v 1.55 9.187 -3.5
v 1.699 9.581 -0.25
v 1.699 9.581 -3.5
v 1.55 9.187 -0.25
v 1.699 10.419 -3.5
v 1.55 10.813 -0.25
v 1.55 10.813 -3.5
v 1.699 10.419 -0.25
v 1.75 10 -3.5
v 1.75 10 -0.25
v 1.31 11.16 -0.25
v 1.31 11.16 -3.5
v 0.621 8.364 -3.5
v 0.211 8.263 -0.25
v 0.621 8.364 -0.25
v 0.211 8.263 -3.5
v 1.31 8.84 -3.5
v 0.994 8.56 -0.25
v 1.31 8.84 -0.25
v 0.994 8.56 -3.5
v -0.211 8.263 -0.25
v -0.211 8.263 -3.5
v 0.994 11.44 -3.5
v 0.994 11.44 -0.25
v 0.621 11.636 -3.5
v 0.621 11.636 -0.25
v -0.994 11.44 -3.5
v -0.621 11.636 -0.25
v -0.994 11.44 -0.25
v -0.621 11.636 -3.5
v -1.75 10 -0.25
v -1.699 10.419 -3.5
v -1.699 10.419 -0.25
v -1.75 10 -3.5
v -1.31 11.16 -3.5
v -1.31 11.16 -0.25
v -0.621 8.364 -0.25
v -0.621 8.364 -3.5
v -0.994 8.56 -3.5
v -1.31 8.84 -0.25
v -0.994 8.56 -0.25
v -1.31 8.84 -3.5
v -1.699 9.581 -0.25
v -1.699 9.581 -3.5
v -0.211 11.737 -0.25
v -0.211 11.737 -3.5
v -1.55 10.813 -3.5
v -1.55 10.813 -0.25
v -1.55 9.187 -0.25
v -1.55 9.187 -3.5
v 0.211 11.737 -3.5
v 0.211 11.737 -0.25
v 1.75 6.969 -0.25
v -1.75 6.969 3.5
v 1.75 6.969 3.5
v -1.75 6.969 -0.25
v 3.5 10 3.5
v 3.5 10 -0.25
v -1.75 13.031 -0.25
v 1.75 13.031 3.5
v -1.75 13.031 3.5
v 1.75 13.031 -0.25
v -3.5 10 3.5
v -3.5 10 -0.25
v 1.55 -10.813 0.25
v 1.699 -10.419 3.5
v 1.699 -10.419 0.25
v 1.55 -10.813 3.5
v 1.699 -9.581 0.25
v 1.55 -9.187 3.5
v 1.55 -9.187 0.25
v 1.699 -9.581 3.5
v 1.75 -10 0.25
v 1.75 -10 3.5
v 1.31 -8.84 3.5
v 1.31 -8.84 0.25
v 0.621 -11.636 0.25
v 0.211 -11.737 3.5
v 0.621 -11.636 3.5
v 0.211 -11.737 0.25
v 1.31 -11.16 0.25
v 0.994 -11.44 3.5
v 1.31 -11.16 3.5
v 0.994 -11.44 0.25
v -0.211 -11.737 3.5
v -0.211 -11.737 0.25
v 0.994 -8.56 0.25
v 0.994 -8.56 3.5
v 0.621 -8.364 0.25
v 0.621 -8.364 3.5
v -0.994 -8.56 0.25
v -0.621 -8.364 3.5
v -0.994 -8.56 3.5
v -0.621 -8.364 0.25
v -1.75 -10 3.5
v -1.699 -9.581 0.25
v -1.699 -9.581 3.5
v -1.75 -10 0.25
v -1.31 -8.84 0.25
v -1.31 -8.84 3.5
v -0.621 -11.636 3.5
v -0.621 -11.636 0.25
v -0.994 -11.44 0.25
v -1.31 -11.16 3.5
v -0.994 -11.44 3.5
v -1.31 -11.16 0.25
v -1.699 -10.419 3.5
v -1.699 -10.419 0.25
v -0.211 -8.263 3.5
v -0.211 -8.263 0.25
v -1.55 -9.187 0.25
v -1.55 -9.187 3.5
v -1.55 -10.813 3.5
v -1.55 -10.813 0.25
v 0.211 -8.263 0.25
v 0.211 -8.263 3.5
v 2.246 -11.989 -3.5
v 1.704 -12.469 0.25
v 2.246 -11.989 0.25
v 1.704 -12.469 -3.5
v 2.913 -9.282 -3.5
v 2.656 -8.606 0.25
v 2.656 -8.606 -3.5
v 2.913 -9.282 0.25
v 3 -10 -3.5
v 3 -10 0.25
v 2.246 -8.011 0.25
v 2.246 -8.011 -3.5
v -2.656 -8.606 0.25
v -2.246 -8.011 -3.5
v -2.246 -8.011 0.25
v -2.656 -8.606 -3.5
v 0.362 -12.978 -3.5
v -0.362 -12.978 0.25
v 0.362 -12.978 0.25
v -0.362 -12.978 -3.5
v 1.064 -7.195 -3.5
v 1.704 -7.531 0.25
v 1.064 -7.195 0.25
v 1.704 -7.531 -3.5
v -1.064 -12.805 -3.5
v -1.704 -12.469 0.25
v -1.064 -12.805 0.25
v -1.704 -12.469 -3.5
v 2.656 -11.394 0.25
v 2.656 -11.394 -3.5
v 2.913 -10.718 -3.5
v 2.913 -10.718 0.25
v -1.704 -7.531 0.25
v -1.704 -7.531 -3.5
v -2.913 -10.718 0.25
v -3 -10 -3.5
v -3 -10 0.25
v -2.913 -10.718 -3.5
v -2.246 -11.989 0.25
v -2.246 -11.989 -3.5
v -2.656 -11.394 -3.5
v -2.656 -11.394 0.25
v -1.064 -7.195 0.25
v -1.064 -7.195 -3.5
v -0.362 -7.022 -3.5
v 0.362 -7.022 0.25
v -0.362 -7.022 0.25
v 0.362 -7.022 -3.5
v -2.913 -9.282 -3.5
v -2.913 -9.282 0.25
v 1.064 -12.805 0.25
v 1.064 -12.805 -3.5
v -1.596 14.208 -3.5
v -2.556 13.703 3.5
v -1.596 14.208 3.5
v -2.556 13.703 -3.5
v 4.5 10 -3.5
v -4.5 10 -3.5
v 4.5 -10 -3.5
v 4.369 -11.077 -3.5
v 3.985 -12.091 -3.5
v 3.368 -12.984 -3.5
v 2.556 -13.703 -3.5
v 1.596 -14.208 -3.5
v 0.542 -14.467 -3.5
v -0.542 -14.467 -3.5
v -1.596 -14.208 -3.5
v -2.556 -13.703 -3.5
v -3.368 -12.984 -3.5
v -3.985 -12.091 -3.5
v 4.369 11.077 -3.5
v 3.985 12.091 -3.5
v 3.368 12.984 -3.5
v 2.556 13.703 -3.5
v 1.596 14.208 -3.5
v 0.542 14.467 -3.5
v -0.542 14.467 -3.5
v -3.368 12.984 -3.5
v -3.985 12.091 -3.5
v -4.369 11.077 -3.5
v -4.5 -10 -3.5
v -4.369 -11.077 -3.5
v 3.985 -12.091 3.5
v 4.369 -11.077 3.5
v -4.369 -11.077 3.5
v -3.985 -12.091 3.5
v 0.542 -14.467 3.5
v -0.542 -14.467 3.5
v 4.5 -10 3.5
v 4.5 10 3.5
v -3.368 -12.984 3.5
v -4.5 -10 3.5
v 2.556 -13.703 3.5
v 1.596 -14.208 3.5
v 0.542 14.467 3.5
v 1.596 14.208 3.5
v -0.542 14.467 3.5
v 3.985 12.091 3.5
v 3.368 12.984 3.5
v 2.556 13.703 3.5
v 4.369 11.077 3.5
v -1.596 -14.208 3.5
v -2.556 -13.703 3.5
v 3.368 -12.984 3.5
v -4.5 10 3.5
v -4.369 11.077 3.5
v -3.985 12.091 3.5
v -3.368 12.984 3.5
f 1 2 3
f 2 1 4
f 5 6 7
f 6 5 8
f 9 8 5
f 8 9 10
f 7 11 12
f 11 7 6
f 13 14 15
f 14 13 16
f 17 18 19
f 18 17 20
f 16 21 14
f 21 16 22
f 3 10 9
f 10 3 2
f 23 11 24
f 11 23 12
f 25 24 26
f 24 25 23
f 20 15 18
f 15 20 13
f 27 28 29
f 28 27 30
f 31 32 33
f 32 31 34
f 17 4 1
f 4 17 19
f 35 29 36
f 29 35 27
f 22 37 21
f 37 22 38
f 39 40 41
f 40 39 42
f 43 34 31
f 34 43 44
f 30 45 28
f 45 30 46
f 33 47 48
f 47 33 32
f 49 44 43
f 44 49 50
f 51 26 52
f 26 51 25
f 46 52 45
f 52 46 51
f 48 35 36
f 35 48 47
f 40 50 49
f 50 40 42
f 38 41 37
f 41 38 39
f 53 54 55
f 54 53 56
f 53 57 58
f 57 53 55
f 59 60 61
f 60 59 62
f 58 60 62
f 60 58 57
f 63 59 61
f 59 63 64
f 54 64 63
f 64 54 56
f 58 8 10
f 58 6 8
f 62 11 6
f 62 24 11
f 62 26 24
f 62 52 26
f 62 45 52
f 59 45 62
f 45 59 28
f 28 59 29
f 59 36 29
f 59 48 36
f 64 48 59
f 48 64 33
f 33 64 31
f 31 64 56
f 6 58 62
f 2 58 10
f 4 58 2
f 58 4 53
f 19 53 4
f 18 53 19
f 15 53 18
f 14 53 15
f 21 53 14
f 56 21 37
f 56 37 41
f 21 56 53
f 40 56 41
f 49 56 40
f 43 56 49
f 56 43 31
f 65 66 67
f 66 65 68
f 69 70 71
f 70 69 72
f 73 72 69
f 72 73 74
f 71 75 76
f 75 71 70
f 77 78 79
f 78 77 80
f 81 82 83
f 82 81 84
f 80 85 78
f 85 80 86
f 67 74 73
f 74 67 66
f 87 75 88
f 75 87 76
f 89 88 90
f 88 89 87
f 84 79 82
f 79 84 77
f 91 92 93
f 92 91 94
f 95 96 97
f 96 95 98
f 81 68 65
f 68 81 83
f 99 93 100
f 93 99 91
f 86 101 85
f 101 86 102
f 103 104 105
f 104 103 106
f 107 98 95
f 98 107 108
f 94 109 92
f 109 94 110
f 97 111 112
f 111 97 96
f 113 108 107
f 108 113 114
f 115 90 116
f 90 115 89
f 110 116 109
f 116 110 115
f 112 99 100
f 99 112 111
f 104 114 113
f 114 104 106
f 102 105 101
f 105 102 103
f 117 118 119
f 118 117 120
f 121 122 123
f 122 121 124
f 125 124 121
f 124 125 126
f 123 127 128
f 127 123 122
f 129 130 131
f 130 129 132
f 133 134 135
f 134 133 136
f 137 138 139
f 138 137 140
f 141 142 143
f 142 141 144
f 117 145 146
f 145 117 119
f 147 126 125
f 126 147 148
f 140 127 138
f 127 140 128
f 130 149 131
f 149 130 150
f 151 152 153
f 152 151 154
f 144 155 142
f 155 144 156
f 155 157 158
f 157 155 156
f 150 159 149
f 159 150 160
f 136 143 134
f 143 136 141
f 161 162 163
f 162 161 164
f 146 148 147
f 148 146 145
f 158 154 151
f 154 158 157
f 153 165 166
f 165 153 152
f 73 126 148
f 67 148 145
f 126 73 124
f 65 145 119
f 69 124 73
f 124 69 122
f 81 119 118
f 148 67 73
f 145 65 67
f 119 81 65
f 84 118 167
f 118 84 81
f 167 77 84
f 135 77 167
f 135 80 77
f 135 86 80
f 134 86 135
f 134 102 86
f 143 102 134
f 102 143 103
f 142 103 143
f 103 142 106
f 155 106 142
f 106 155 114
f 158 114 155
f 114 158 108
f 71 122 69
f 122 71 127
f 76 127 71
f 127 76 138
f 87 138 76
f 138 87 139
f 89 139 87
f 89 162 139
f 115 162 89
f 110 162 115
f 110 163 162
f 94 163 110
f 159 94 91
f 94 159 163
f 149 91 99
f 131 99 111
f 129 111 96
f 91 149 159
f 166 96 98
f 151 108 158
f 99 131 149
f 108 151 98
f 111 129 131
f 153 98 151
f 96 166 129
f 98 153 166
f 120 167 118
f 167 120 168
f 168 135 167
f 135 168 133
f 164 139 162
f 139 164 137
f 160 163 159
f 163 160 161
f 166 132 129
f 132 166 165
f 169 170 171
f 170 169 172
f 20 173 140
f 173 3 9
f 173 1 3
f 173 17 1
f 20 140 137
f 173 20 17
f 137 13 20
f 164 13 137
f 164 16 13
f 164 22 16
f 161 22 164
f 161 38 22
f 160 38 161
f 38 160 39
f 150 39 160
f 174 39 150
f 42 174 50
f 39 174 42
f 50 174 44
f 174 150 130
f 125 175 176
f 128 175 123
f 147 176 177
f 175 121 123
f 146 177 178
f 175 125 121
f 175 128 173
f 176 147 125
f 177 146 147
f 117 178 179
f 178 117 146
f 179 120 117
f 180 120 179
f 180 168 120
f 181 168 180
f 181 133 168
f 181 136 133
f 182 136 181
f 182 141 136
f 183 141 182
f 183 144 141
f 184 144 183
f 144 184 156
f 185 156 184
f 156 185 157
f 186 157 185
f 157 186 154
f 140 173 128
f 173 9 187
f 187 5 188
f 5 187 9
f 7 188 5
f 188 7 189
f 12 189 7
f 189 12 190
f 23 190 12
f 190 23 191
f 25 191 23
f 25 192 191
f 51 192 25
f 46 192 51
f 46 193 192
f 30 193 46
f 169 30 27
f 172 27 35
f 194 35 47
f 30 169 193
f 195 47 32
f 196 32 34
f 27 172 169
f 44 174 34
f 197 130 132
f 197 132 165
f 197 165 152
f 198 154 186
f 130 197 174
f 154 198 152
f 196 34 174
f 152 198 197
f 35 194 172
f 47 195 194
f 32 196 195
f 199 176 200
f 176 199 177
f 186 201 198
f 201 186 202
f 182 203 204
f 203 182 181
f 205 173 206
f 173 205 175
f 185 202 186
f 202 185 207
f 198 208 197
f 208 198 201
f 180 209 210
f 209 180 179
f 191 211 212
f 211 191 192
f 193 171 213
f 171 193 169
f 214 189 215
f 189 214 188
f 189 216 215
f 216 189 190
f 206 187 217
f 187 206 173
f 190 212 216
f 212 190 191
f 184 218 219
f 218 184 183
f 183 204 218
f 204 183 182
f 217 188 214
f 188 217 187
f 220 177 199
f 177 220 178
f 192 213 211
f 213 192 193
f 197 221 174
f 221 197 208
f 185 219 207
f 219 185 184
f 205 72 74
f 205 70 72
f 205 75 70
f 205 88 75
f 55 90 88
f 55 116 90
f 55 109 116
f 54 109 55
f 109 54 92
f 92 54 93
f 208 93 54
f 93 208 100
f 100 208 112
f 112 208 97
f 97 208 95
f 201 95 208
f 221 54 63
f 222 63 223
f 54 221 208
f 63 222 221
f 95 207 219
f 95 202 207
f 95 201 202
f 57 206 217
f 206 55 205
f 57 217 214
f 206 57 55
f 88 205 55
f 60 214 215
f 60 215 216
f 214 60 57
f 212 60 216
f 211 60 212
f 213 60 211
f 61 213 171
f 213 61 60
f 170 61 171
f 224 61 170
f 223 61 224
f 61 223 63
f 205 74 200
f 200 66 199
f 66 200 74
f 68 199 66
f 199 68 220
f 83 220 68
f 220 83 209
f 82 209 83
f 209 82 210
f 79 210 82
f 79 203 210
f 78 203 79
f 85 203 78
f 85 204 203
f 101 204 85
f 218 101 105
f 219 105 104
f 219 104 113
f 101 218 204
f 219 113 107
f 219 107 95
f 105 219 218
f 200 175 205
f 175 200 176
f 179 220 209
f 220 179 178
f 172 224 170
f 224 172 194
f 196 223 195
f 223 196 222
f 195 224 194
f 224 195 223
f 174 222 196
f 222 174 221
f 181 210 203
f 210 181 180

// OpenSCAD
// RAMPS board spacer
// By Julio Galaron (@jgalaron)
// cc by-sa 4.0 International

module body(size=20){
	hull(){
		translate([0,size/2,0])  rotate([0,0,0]) cylinder(h=7, r=9/2, $fn=26, center=true);
		translate([0,-size/2,0]) rotate([0,0,0]) cylinder(h=7, r=9/2, $fn=26, center=true);
	}
}

module holes(size=20){
	translate([0,size/2,0]){
		translate([0,0,0]) cylinder(h=8, r=3.5/2, $fn=26, center=true);
		translate([0,0,2]) cylinder(h=4.5, r=7/2, $fn=6, center=true);
	}

	translate([0,-size/2,0]){
		translate([0,0,0])  cylinder(h=8, r=3.5/2, $fn=26, center=true);
		translate([0,0,-2]) cylinder(h=4.5, r=6/2, $fn=26, center=true);
	}
}

//final part
difference(){
	body();
	holes();
}
